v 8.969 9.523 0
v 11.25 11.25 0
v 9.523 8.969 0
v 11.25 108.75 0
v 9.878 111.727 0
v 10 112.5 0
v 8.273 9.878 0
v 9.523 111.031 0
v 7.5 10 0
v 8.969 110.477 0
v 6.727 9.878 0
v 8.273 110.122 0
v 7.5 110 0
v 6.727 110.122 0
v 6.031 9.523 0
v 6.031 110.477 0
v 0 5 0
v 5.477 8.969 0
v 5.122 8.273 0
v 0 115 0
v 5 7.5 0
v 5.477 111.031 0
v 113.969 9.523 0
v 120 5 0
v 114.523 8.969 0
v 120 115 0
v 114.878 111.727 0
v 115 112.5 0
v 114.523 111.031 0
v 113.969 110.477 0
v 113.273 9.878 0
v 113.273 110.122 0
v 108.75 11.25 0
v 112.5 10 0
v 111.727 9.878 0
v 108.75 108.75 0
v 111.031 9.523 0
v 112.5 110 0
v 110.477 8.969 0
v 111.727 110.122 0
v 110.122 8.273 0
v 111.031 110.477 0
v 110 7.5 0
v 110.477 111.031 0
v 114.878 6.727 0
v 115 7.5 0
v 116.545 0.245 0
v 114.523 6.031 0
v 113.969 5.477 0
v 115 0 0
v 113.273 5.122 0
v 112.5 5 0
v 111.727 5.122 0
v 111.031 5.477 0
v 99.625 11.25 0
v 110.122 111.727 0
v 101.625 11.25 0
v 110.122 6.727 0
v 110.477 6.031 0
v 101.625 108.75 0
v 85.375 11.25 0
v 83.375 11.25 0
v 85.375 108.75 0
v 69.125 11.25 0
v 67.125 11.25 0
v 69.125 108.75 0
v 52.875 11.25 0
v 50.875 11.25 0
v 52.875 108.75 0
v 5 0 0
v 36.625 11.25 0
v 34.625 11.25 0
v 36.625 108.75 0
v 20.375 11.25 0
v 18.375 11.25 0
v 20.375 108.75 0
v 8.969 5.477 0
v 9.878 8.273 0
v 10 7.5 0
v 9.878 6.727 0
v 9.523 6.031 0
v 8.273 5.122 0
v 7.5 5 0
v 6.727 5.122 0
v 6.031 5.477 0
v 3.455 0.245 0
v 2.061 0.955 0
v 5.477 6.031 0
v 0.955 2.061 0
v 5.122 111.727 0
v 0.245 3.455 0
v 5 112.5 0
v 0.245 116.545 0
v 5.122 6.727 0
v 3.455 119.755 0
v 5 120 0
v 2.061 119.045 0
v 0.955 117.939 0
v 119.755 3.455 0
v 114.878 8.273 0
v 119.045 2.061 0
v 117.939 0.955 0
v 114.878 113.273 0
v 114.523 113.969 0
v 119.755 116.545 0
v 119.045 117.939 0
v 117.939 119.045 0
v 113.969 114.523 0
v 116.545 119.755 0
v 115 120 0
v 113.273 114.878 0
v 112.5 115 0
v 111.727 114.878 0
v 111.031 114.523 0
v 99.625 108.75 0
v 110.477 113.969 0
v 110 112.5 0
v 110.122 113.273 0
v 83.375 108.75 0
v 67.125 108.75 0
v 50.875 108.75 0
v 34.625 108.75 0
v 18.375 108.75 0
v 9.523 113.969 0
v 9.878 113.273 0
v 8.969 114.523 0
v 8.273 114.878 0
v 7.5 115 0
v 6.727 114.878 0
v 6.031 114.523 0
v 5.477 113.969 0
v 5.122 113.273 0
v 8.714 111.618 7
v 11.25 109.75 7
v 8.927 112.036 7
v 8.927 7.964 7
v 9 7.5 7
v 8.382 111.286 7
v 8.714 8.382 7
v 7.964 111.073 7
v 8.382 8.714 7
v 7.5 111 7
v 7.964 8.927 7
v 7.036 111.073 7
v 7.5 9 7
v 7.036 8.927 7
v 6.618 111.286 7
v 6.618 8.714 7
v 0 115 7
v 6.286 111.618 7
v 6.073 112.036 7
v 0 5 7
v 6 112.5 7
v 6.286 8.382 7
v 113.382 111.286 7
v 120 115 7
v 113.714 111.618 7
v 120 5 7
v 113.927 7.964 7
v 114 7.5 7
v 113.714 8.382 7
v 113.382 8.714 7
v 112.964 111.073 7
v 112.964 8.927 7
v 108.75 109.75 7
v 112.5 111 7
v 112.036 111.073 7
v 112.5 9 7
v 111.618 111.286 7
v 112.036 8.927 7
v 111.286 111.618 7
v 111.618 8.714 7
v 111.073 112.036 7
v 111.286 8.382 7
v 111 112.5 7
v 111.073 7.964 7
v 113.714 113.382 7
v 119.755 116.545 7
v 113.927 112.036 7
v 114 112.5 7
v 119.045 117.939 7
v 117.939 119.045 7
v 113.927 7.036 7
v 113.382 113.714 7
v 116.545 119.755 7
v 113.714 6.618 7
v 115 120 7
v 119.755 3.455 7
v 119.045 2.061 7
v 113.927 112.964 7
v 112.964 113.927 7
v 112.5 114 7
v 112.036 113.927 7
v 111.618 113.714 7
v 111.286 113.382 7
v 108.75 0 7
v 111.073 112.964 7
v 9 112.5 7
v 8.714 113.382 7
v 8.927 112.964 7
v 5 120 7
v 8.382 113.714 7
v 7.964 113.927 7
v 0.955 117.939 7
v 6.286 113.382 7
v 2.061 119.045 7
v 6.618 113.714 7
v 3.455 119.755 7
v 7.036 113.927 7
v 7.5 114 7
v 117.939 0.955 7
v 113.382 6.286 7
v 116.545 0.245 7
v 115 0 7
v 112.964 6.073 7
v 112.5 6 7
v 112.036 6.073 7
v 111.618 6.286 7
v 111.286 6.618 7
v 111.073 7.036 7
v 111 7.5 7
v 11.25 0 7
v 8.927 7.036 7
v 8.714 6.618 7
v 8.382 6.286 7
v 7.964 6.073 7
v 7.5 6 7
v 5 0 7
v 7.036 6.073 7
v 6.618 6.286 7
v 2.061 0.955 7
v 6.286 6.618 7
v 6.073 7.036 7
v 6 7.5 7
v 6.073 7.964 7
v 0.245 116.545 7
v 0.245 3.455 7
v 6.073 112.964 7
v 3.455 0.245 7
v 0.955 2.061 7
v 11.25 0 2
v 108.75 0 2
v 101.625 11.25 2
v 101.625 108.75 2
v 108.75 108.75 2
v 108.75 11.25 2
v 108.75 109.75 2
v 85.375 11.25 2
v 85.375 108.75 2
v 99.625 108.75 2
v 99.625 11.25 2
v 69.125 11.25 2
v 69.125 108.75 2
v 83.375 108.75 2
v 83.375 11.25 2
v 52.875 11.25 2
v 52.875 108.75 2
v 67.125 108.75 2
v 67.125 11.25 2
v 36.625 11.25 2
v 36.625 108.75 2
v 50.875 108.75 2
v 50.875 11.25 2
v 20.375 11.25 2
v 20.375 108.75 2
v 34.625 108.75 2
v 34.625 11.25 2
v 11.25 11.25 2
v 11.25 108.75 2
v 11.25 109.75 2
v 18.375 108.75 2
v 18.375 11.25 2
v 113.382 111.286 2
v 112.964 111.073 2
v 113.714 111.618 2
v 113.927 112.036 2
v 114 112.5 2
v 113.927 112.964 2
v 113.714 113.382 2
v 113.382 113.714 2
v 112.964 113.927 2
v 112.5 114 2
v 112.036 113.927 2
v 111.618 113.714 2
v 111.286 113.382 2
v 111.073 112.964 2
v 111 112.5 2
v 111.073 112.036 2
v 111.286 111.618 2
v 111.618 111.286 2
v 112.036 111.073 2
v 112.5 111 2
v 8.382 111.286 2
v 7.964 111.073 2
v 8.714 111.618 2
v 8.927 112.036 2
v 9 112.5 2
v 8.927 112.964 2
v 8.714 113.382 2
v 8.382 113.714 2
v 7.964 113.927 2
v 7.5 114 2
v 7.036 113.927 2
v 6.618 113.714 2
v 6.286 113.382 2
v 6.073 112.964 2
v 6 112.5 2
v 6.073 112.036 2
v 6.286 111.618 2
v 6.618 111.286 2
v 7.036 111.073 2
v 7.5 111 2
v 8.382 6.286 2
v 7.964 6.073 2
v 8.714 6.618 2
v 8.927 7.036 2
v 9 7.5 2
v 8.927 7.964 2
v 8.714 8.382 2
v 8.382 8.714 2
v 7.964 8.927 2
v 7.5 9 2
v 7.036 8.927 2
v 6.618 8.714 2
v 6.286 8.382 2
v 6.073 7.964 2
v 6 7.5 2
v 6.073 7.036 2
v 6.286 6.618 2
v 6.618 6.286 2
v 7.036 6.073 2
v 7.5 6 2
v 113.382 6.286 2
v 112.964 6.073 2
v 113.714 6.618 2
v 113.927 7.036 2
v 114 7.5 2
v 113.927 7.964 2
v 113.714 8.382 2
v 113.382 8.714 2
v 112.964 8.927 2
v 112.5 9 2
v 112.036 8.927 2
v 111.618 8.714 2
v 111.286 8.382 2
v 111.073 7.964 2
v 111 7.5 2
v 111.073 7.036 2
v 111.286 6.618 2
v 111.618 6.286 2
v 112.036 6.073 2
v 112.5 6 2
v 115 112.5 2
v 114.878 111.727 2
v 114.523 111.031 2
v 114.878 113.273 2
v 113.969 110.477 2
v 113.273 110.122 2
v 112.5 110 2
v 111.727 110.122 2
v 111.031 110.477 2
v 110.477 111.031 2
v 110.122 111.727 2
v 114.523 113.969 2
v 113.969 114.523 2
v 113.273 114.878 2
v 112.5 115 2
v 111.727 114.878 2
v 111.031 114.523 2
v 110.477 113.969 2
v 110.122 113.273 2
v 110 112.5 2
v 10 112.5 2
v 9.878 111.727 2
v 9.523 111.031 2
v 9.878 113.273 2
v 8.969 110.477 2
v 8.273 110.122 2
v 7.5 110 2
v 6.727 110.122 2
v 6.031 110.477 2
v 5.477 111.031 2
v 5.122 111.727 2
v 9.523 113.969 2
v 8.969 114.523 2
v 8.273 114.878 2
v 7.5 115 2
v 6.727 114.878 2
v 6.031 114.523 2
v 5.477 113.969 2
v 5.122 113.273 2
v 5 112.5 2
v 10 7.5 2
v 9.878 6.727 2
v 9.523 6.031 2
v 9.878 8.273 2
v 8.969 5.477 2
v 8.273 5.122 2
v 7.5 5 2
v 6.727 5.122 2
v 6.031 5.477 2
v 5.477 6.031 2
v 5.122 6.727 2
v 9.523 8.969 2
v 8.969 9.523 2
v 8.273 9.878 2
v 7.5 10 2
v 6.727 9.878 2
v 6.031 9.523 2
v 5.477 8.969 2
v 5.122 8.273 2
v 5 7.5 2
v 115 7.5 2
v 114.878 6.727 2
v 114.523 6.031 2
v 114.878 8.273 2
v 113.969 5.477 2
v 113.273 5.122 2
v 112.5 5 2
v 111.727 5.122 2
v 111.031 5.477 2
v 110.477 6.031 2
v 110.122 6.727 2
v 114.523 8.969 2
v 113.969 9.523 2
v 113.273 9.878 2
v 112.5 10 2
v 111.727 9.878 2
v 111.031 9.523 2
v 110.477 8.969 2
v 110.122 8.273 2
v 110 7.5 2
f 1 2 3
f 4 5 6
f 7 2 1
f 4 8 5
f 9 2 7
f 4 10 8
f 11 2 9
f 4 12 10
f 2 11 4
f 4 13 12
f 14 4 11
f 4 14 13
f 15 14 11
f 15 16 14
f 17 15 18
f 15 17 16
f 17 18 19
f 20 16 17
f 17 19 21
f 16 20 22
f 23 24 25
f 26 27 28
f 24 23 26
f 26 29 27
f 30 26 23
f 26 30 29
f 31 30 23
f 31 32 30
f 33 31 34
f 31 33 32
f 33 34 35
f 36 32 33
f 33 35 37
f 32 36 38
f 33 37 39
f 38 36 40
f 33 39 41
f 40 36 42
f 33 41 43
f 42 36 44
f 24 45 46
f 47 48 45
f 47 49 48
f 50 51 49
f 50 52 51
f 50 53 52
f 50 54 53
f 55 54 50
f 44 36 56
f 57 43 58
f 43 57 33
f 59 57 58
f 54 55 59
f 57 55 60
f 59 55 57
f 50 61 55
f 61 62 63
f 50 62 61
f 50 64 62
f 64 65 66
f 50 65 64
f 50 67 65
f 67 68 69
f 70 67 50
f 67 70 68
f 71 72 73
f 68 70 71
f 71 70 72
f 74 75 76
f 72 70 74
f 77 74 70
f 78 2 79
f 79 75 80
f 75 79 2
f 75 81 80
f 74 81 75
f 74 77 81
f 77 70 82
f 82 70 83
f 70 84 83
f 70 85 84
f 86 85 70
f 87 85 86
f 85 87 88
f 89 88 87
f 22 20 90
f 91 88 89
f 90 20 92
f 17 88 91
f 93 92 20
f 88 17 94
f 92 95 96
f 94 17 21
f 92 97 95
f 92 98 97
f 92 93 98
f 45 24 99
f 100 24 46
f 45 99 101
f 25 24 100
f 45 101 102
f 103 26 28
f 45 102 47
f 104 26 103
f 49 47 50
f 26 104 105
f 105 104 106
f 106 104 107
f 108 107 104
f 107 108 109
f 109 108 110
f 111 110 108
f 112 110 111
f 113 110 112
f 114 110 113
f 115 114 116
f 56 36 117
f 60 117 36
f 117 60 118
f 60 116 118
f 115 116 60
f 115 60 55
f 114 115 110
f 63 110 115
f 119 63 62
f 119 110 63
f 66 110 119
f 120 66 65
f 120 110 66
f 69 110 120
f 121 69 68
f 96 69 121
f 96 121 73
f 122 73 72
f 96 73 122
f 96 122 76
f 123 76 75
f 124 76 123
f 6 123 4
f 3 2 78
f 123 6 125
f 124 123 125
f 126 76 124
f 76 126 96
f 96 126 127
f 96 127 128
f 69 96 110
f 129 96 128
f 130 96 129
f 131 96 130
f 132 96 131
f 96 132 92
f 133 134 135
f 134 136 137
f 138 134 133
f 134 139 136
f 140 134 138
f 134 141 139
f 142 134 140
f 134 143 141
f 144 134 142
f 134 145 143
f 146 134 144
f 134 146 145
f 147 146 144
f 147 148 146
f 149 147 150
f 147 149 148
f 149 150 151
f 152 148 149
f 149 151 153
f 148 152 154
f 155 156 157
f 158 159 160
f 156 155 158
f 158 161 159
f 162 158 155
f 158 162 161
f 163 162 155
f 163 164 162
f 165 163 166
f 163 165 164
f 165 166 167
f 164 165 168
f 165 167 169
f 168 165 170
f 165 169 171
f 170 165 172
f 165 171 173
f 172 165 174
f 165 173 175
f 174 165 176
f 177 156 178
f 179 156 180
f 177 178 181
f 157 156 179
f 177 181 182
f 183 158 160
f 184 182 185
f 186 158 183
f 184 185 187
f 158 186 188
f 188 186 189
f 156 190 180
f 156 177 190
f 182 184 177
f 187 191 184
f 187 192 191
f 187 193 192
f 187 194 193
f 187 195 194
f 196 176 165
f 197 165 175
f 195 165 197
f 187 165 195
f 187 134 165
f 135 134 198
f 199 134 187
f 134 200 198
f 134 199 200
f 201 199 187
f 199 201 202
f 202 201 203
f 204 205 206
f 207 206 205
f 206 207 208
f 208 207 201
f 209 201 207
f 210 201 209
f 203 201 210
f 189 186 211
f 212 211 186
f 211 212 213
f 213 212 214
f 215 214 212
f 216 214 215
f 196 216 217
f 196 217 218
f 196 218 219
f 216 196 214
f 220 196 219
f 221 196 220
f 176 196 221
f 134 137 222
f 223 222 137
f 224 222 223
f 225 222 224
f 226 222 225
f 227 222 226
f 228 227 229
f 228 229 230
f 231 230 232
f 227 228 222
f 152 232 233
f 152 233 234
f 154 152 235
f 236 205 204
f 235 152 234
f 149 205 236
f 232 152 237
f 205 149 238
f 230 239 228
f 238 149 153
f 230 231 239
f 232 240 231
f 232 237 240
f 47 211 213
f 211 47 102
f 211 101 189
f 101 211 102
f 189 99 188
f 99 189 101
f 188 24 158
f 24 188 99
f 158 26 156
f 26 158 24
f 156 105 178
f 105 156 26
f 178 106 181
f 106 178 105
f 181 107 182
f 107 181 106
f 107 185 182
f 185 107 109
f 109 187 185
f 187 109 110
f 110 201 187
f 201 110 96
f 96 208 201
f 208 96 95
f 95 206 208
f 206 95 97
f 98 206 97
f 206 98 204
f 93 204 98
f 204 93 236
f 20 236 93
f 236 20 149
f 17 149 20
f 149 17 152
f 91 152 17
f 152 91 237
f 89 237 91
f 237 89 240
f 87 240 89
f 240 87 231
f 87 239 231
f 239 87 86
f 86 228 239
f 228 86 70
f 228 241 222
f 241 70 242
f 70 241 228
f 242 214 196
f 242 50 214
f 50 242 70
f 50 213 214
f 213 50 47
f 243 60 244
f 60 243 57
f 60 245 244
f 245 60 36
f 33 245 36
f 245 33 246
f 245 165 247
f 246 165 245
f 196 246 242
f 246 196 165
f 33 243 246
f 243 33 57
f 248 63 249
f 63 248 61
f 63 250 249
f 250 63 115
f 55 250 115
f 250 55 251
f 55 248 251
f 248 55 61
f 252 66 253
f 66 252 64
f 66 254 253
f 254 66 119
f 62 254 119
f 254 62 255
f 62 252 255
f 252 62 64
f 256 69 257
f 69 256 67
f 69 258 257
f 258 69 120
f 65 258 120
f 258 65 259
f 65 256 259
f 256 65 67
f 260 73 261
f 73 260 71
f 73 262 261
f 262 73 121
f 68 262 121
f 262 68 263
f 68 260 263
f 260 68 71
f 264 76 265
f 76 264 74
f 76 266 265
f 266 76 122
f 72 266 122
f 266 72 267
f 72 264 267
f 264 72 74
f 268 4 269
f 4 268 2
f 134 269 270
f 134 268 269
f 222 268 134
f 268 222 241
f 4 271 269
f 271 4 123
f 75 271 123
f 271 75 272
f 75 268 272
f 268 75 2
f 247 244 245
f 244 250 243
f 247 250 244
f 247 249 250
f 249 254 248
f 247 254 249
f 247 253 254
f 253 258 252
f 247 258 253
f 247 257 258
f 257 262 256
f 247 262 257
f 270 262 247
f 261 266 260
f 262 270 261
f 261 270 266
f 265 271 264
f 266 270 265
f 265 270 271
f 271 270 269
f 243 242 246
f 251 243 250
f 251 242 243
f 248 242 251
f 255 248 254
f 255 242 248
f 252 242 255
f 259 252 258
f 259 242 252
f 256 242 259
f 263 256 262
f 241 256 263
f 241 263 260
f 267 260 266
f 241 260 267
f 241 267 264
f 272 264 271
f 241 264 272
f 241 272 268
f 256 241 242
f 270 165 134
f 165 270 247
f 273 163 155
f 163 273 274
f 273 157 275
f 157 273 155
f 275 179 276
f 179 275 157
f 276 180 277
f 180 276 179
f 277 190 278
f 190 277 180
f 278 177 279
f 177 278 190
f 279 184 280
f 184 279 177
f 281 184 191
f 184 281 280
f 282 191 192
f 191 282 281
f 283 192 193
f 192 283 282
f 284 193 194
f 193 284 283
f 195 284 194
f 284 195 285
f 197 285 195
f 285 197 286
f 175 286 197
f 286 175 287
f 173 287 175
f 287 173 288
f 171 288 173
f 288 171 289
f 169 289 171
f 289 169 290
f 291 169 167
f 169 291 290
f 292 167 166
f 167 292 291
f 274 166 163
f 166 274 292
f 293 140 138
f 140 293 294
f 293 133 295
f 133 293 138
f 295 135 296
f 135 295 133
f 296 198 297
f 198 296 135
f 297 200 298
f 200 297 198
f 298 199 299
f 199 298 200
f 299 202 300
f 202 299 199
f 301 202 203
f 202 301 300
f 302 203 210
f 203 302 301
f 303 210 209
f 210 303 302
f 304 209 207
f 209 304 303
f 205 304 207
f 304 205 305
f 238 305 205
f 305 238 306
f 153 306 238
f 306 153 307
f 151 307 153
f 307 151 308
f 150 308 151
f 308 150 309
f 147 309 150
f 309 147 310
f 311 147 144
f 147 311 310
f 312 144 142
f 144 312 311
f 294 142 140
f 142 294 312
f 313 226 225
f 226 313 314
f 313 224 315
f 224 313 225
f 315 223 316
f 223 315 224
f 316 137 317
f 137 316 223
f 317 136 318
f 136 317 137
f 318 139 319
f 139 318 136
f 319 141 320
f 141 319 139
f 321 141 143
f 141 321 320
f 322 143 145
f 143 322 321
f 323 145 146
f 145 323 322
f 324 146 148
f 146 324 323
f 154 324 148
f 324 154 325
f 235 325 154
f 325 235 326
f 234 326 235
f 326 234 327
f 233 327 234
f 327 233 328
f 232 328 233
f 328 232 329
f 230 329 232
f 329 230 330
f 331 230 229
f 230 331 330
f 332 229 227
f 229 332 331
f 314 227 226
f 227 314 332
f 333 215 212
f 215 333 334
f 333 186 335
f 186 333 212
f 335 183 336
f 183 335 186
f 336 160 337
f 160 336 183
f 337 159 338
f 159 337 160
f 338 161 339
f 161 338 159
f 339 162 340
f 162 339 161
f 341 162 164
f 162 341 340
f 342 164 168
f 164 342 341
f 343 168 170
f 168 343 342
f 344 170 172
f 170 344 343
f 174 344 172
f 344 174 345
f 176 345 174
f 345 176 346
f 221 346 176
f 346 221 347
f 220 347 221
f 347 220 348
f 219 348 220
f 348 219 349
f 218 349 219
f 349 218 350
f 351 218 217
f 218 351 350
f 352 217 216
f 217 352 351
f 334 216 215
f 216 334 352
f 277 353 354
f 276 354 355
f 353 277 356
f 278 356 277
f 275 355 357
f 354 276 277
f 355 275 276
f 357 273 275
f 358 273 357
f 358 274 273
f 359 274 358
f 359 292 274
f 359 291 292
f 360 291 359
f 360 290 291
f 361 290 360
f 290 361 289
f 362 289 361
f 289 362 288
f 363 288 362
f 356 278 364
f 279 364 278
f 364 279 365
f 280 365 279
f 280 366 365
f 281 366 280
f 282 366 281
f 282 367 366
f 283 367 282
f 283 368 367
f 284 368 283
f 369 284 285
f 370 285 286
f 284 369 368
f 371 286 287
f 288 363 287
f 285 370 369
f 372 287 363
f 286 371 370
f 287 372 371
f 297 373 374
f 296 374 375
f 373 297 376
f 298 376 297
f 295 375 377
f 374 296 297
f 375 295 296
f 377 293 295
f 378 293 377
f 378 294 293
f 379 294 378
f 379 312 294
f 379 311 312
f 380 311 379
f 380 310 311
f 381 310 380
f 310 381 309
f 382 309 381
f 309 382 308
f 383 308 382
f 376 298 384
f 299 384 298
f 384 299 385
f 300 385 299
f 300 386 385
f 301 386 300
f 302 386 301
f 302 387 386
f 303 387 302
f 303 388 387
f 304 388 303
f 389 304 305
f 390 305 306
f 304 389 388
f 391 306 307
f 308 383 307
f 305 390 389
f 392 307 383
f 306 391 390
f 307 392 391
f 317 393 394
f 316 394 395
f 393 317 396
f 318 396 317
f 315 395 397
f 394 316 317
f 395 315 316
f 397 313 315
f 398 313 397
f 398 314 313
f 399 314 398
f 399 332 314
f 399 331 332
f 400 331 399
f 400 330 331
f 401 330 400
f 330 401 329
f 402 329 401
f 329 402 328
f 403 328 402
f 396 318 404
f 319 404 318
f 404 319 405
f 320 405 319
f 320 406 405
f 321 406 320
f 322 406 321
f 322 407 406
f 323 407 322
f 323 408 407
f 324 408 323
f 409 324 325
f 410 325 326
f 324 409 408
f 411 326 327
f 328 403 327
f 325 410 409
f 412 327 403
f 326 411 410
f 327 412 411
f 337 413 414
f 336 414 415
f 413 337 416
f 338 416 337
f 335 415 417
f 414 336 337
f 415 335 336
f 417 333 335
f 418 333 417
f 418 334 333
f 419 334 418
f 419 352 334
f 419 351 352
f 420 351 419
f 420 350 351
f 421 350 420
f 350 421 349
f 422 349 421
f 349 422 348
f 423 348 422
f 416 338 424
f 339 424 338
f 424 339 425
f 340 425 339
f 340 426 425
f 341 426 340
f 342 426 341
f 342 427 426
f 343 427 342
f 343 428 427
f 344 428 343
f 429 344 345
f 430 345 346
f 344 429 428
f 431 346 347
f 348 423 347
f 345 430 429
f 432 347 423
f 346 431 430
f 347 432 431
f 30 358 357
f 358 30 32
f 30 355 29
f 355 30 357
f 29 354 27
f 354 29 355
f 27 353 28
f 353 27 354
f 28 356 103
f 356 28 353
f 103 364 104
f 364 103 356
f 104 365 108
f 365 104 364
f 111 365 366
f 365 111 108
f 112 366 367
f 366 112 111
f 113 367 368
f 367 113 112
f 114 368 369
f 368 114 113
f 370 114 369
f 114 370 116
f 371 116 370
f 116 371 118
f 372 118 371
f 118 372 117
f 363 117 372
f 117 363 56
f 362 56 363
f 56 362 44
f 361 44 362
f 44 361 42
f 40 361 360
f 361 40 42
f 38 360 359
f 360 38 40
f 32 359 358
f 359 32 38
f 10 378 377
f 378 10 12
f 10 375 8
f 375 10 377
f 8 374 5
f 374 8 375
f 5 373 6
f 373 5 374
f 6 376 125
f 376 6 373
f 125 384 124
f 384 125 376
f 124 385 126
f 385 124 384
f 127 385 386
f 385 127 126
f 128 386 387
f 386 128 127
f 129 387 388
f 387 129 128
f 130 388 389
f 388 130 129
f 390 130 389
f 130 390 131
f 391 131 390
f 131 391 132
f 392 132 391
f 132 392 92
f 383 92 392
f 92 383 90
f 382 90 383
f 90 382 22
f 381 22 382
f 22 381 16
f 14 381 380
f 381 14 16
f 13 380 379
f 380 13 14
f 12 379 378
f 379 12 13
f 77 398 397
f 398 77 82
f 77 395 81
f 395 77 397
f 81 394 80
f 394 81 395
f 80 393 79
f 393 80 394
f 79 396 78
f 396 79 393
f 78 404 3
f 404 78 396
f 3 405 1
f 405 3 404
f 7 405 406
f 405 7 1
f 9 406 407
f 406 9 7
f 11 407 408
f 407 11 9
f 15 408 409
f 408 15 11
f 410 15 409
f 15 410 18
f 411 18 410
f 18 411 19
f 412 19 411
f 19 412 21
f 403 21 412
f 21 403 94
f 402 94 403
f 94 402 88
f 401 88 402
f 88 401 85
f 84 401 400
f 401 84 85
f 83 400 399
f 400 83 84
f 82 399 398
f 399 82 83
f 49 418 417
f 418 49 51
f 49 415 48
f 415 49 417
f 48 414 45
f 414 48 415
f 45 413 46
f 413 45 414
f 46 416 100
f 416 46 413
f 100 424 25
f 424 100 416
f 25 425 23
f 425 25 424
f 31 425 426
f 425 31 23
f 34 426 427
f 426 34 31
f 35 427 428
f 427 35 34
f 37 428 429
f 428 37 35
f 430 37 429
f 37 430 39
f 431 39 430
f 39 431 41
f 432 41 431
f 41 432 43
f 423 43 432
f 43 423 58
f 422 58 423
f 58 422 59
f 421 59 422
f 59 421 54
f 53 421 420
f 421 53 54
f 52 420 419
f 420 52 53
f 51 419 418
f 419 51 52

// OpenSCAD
// file: ../lib/utils.scad
include <params.scad>;

function tol(val) = val - tolerance;

module cone(r, angle, invert=false) {
    h = tan((180 - angle) / 2) * r;
    translate([0, 0, -h]) {
        if (invert) {
                cylinder(r1=r,r2=0,h=h, $fn=20); 
        } else {
            cylinder(r1=0,r2=r,h=h, $fn=20); 
        }
    }
}

module roundrect(vect, r, $fn=20) {
    sq = len(vect) > 1
        ? [for (i = [0:1:len(vect)-1]) vect[i] - r * 2]
        : vect - r * 2;
    minkowski() {
        square(sq);
        translate([r, r])
            circle(r=r);
    }
}

module profile($fn=20) {
    minkowski() {
        translate([fan_case_radius, fan_case_radius, 0])
            square(fan_case - fan_case_radius * 2);
        circle(fan_case_radius, $fn);
    }
}

module fan_mount_points(radius, $fn=20) {
    offset = (fan_case - fan_screw_distance) / 2;
    translate([offset, offset, 0]) {
        circle(radius, $fn);
        translate([fan_screw_distance, 0, 0])
            circle(radius, $fn);
        translate([fan_screw_distance, fan_screw_distance, 0])
            circle(radius, $fn);
        translate([0, fan_screw_distance, 0])
            circle(radius, $fn);
    }
}

module square_grill(width, height, fin_width, fin_count) {
    fin_spacing = width / fin_count;
    difference() {
        square(width);
        union() {
            for (i = [0:1:fin_count]) {
                translate([(i + 1) * fin_spacing - (fin_spacing / 2) - (fin_width / 2), 0, 0])
                    square([fin_width, height]);
            }
        }
    }
}

module bushing(outer_r, inner_r, h) {
    linear_extrude(h)
        difference() {
            circle(r=outer_r);
            circle(r=inner_r);
        }
}

module screw_at_origin(r, d, l, head, head_d, cap, angle) {
    translate([0, 0, -l])
        screw(r, d, l, head, head_d, cap, angle);
}

module screw(r, d, l, head, head_d, cap, angle, fn=20, head_fn) {
    radius = r > 0 ? r : d / 2;
    head_r = head > 0 ? head : head_d / 2;
    hfn = head_fn ? head_fn : fn;

    union() {
        if (angle) {
            translate([0, 0, l])
                cone(head_r, angle, false);
        }
        linear_extrude(l)
            circle(r=radius, $fn=fn);
        if (cap > 0) {
            translate([0, 0, l - cap])
                linear_extrude(cap)
                    circle(r=head_r, $fn=hfn);
        }
    }
}

module inset_screw(r, d, l, head, head_d, cap, angle, inset, fn=20, head_fn) {
    screw_height = l - inset;
    head_r = head > 0 ? head : head_d / 2;

    union() {
        screw(
            r=r,
            d=d,
            l=screw_height,
            head=head_r,
            cap=cap,
            angle=angle,
            fn=fn,
            head_fn=head_fn
        );
        translate([0, 0, screw_height])
            linear_extrude(inset)
                circle(r=head_r, $fn=fn);
    }
}

function inch_to_mm(inches) = inches * 25.4;
// file: ../lib/params.scad
/*************/
/** Exhaust **/
/*************/

/**
 * Fan case sizes: used for all fan parts, including adapters, inlets
 * grills.
 */
fan_case = 120;
fan_screw_distance = 105;
fan_case_depth = 25;
fan_case_radius = 5;
fan_case_screw_radius = 2.5;
fan_case_socket_cap_radius = 5.6 / 2;
fan_case_screw_head_radius = 3;
fan_case_screw_head_angle = 90;

/**
 * Fan grill
 */
grill_screw_size = 3;
grill_screw_radius = grill_screw_size / 2;
grill_screw_inset = 2;
grill_radius = 114 / 2;
grill_fin_offset = 10;
grill_fin_thickness = 2;
grill_fin_degrees = 30;

rear_grill_thickness = 2;

front_grill_thickness = 2;
front_grill_fin_count = 6;
front_grill_fin_thickness = 2;

/**
 * Fan duct filter
 */
filter_thickness = 5;
filter_width = fan_screw_distance - fan_case_screw_radius * 3;
filter_offset = (fan_case - filter_width) / 2;

base_retainer_thickness = 2;
base_height = 30;
base_cut_offset = 10;
base_retainer_inset = 4;

/**
 * Fan to duct adapter
 */
adapter_thickness = 2;
adapter_duct_in = 4;
adapter_height = 14;
adapter_duct_height = 50;
flat_adapter_duct_height = 50;
flat_adapter_screw_radius = 2;
flat_adapter_screw_head_radius = 4;

/**
 * Fan adapter filter caddy
 */
caddy_thickness = 2;
caddy_handle_width = 20;
caddy_handle_depth = 10;
caddy_handle_grip_count = 5;
caddy_handle_grip_depth = 1;
caddy_handle_grip_width = 1;
caddy_clip_height = 2;
caddy_clip_depth = 6;
caddy_clip_offset = 1;

/***************/
/** Enclosure **/
/***************/

/**
 * Enclosure foot
 */
foot_lower_radius = 15;
foot_upper_radius = 20;
foot_height = 18;
foot_inset_radius = 4;
foot_inset_depth = 3;
foot_screw_radius = 4;
foot_screw_inset = 6;
foot_screw_head_radius = 8;

/**
 * Power supply attachment
 */
power_supply_case_thickness = 3.0;
power_supply_screw_radius = 1.5;
power_supply_bushing_radius = 7.5;

power_supply_cable_pass_width = 18;
power_supply_cable_pass_height = 5;
power_supply_cable_pass_overhang = 5;
power_supply_cable_pass_overhang_depth = power_supply_case_thickness;
power_supply_cable_pass_depth = 3;
power_supply_cable_pass_thickness = 3;

/**************/
/** Filament **/
/**************/

/**
 * Filament case passthrough
 */
through_base_width = 60;
through_base_height = 20;
through_base_depth = 5;
through_base_screw_offset = 10;
through_base_screw_radius = 1.5;
through_base_screw_head = 2.8;
through_base_nut_head = 3.25;
through_base_nut_inset = 3;
through_base_screw_inset = 3;
through_base_fitting_d = 5;
case_thickness = 1;
case_through_radius = 6;
filament_radius = 1;

inlet_length = 10;
inlet_outer_radius = 3;
inlet_inner_radius = 2;
inlet_angle = -20;


/**********/
/** Misc **/
/**********/

// tolerance is used all over the place to decide how closely parts fit
// together; adjust to the tolerances of your printer. 0.2 works fine for
// a Prusa i3 MK3.
tolerance = 0.2;
// main file
include <../lib/params.scad>;
use <../lib/utils.scad>;

total_height = front_grill_thickness + filter_thickness;

difference() {
    union() {
        linear_extrude(height=total_height)
            difference() {
                profile();
                translate([filter_offset, filter_offset])
                    square_grill(filter_width, filter_width, front_grill_fin_thickness, front_grill_fin_count);
            }
    }
    // filter insert
    translate([filter_offset, 0, front_grill_thickness])
        linear_extrude(height=filter_thickness)
            square([filter_width, filter_width + filter_offset + front_grill_fin_thickness / 2]);
    // screw holes
    linear_extrude(height=total_height)
        fan_mount_points(grill_screw_size/2);
    // inset screw points, bottom
    linear_extrude(height=grill_screw_inset)
        fan_mount_points(fan_case_screw_radius);
}
